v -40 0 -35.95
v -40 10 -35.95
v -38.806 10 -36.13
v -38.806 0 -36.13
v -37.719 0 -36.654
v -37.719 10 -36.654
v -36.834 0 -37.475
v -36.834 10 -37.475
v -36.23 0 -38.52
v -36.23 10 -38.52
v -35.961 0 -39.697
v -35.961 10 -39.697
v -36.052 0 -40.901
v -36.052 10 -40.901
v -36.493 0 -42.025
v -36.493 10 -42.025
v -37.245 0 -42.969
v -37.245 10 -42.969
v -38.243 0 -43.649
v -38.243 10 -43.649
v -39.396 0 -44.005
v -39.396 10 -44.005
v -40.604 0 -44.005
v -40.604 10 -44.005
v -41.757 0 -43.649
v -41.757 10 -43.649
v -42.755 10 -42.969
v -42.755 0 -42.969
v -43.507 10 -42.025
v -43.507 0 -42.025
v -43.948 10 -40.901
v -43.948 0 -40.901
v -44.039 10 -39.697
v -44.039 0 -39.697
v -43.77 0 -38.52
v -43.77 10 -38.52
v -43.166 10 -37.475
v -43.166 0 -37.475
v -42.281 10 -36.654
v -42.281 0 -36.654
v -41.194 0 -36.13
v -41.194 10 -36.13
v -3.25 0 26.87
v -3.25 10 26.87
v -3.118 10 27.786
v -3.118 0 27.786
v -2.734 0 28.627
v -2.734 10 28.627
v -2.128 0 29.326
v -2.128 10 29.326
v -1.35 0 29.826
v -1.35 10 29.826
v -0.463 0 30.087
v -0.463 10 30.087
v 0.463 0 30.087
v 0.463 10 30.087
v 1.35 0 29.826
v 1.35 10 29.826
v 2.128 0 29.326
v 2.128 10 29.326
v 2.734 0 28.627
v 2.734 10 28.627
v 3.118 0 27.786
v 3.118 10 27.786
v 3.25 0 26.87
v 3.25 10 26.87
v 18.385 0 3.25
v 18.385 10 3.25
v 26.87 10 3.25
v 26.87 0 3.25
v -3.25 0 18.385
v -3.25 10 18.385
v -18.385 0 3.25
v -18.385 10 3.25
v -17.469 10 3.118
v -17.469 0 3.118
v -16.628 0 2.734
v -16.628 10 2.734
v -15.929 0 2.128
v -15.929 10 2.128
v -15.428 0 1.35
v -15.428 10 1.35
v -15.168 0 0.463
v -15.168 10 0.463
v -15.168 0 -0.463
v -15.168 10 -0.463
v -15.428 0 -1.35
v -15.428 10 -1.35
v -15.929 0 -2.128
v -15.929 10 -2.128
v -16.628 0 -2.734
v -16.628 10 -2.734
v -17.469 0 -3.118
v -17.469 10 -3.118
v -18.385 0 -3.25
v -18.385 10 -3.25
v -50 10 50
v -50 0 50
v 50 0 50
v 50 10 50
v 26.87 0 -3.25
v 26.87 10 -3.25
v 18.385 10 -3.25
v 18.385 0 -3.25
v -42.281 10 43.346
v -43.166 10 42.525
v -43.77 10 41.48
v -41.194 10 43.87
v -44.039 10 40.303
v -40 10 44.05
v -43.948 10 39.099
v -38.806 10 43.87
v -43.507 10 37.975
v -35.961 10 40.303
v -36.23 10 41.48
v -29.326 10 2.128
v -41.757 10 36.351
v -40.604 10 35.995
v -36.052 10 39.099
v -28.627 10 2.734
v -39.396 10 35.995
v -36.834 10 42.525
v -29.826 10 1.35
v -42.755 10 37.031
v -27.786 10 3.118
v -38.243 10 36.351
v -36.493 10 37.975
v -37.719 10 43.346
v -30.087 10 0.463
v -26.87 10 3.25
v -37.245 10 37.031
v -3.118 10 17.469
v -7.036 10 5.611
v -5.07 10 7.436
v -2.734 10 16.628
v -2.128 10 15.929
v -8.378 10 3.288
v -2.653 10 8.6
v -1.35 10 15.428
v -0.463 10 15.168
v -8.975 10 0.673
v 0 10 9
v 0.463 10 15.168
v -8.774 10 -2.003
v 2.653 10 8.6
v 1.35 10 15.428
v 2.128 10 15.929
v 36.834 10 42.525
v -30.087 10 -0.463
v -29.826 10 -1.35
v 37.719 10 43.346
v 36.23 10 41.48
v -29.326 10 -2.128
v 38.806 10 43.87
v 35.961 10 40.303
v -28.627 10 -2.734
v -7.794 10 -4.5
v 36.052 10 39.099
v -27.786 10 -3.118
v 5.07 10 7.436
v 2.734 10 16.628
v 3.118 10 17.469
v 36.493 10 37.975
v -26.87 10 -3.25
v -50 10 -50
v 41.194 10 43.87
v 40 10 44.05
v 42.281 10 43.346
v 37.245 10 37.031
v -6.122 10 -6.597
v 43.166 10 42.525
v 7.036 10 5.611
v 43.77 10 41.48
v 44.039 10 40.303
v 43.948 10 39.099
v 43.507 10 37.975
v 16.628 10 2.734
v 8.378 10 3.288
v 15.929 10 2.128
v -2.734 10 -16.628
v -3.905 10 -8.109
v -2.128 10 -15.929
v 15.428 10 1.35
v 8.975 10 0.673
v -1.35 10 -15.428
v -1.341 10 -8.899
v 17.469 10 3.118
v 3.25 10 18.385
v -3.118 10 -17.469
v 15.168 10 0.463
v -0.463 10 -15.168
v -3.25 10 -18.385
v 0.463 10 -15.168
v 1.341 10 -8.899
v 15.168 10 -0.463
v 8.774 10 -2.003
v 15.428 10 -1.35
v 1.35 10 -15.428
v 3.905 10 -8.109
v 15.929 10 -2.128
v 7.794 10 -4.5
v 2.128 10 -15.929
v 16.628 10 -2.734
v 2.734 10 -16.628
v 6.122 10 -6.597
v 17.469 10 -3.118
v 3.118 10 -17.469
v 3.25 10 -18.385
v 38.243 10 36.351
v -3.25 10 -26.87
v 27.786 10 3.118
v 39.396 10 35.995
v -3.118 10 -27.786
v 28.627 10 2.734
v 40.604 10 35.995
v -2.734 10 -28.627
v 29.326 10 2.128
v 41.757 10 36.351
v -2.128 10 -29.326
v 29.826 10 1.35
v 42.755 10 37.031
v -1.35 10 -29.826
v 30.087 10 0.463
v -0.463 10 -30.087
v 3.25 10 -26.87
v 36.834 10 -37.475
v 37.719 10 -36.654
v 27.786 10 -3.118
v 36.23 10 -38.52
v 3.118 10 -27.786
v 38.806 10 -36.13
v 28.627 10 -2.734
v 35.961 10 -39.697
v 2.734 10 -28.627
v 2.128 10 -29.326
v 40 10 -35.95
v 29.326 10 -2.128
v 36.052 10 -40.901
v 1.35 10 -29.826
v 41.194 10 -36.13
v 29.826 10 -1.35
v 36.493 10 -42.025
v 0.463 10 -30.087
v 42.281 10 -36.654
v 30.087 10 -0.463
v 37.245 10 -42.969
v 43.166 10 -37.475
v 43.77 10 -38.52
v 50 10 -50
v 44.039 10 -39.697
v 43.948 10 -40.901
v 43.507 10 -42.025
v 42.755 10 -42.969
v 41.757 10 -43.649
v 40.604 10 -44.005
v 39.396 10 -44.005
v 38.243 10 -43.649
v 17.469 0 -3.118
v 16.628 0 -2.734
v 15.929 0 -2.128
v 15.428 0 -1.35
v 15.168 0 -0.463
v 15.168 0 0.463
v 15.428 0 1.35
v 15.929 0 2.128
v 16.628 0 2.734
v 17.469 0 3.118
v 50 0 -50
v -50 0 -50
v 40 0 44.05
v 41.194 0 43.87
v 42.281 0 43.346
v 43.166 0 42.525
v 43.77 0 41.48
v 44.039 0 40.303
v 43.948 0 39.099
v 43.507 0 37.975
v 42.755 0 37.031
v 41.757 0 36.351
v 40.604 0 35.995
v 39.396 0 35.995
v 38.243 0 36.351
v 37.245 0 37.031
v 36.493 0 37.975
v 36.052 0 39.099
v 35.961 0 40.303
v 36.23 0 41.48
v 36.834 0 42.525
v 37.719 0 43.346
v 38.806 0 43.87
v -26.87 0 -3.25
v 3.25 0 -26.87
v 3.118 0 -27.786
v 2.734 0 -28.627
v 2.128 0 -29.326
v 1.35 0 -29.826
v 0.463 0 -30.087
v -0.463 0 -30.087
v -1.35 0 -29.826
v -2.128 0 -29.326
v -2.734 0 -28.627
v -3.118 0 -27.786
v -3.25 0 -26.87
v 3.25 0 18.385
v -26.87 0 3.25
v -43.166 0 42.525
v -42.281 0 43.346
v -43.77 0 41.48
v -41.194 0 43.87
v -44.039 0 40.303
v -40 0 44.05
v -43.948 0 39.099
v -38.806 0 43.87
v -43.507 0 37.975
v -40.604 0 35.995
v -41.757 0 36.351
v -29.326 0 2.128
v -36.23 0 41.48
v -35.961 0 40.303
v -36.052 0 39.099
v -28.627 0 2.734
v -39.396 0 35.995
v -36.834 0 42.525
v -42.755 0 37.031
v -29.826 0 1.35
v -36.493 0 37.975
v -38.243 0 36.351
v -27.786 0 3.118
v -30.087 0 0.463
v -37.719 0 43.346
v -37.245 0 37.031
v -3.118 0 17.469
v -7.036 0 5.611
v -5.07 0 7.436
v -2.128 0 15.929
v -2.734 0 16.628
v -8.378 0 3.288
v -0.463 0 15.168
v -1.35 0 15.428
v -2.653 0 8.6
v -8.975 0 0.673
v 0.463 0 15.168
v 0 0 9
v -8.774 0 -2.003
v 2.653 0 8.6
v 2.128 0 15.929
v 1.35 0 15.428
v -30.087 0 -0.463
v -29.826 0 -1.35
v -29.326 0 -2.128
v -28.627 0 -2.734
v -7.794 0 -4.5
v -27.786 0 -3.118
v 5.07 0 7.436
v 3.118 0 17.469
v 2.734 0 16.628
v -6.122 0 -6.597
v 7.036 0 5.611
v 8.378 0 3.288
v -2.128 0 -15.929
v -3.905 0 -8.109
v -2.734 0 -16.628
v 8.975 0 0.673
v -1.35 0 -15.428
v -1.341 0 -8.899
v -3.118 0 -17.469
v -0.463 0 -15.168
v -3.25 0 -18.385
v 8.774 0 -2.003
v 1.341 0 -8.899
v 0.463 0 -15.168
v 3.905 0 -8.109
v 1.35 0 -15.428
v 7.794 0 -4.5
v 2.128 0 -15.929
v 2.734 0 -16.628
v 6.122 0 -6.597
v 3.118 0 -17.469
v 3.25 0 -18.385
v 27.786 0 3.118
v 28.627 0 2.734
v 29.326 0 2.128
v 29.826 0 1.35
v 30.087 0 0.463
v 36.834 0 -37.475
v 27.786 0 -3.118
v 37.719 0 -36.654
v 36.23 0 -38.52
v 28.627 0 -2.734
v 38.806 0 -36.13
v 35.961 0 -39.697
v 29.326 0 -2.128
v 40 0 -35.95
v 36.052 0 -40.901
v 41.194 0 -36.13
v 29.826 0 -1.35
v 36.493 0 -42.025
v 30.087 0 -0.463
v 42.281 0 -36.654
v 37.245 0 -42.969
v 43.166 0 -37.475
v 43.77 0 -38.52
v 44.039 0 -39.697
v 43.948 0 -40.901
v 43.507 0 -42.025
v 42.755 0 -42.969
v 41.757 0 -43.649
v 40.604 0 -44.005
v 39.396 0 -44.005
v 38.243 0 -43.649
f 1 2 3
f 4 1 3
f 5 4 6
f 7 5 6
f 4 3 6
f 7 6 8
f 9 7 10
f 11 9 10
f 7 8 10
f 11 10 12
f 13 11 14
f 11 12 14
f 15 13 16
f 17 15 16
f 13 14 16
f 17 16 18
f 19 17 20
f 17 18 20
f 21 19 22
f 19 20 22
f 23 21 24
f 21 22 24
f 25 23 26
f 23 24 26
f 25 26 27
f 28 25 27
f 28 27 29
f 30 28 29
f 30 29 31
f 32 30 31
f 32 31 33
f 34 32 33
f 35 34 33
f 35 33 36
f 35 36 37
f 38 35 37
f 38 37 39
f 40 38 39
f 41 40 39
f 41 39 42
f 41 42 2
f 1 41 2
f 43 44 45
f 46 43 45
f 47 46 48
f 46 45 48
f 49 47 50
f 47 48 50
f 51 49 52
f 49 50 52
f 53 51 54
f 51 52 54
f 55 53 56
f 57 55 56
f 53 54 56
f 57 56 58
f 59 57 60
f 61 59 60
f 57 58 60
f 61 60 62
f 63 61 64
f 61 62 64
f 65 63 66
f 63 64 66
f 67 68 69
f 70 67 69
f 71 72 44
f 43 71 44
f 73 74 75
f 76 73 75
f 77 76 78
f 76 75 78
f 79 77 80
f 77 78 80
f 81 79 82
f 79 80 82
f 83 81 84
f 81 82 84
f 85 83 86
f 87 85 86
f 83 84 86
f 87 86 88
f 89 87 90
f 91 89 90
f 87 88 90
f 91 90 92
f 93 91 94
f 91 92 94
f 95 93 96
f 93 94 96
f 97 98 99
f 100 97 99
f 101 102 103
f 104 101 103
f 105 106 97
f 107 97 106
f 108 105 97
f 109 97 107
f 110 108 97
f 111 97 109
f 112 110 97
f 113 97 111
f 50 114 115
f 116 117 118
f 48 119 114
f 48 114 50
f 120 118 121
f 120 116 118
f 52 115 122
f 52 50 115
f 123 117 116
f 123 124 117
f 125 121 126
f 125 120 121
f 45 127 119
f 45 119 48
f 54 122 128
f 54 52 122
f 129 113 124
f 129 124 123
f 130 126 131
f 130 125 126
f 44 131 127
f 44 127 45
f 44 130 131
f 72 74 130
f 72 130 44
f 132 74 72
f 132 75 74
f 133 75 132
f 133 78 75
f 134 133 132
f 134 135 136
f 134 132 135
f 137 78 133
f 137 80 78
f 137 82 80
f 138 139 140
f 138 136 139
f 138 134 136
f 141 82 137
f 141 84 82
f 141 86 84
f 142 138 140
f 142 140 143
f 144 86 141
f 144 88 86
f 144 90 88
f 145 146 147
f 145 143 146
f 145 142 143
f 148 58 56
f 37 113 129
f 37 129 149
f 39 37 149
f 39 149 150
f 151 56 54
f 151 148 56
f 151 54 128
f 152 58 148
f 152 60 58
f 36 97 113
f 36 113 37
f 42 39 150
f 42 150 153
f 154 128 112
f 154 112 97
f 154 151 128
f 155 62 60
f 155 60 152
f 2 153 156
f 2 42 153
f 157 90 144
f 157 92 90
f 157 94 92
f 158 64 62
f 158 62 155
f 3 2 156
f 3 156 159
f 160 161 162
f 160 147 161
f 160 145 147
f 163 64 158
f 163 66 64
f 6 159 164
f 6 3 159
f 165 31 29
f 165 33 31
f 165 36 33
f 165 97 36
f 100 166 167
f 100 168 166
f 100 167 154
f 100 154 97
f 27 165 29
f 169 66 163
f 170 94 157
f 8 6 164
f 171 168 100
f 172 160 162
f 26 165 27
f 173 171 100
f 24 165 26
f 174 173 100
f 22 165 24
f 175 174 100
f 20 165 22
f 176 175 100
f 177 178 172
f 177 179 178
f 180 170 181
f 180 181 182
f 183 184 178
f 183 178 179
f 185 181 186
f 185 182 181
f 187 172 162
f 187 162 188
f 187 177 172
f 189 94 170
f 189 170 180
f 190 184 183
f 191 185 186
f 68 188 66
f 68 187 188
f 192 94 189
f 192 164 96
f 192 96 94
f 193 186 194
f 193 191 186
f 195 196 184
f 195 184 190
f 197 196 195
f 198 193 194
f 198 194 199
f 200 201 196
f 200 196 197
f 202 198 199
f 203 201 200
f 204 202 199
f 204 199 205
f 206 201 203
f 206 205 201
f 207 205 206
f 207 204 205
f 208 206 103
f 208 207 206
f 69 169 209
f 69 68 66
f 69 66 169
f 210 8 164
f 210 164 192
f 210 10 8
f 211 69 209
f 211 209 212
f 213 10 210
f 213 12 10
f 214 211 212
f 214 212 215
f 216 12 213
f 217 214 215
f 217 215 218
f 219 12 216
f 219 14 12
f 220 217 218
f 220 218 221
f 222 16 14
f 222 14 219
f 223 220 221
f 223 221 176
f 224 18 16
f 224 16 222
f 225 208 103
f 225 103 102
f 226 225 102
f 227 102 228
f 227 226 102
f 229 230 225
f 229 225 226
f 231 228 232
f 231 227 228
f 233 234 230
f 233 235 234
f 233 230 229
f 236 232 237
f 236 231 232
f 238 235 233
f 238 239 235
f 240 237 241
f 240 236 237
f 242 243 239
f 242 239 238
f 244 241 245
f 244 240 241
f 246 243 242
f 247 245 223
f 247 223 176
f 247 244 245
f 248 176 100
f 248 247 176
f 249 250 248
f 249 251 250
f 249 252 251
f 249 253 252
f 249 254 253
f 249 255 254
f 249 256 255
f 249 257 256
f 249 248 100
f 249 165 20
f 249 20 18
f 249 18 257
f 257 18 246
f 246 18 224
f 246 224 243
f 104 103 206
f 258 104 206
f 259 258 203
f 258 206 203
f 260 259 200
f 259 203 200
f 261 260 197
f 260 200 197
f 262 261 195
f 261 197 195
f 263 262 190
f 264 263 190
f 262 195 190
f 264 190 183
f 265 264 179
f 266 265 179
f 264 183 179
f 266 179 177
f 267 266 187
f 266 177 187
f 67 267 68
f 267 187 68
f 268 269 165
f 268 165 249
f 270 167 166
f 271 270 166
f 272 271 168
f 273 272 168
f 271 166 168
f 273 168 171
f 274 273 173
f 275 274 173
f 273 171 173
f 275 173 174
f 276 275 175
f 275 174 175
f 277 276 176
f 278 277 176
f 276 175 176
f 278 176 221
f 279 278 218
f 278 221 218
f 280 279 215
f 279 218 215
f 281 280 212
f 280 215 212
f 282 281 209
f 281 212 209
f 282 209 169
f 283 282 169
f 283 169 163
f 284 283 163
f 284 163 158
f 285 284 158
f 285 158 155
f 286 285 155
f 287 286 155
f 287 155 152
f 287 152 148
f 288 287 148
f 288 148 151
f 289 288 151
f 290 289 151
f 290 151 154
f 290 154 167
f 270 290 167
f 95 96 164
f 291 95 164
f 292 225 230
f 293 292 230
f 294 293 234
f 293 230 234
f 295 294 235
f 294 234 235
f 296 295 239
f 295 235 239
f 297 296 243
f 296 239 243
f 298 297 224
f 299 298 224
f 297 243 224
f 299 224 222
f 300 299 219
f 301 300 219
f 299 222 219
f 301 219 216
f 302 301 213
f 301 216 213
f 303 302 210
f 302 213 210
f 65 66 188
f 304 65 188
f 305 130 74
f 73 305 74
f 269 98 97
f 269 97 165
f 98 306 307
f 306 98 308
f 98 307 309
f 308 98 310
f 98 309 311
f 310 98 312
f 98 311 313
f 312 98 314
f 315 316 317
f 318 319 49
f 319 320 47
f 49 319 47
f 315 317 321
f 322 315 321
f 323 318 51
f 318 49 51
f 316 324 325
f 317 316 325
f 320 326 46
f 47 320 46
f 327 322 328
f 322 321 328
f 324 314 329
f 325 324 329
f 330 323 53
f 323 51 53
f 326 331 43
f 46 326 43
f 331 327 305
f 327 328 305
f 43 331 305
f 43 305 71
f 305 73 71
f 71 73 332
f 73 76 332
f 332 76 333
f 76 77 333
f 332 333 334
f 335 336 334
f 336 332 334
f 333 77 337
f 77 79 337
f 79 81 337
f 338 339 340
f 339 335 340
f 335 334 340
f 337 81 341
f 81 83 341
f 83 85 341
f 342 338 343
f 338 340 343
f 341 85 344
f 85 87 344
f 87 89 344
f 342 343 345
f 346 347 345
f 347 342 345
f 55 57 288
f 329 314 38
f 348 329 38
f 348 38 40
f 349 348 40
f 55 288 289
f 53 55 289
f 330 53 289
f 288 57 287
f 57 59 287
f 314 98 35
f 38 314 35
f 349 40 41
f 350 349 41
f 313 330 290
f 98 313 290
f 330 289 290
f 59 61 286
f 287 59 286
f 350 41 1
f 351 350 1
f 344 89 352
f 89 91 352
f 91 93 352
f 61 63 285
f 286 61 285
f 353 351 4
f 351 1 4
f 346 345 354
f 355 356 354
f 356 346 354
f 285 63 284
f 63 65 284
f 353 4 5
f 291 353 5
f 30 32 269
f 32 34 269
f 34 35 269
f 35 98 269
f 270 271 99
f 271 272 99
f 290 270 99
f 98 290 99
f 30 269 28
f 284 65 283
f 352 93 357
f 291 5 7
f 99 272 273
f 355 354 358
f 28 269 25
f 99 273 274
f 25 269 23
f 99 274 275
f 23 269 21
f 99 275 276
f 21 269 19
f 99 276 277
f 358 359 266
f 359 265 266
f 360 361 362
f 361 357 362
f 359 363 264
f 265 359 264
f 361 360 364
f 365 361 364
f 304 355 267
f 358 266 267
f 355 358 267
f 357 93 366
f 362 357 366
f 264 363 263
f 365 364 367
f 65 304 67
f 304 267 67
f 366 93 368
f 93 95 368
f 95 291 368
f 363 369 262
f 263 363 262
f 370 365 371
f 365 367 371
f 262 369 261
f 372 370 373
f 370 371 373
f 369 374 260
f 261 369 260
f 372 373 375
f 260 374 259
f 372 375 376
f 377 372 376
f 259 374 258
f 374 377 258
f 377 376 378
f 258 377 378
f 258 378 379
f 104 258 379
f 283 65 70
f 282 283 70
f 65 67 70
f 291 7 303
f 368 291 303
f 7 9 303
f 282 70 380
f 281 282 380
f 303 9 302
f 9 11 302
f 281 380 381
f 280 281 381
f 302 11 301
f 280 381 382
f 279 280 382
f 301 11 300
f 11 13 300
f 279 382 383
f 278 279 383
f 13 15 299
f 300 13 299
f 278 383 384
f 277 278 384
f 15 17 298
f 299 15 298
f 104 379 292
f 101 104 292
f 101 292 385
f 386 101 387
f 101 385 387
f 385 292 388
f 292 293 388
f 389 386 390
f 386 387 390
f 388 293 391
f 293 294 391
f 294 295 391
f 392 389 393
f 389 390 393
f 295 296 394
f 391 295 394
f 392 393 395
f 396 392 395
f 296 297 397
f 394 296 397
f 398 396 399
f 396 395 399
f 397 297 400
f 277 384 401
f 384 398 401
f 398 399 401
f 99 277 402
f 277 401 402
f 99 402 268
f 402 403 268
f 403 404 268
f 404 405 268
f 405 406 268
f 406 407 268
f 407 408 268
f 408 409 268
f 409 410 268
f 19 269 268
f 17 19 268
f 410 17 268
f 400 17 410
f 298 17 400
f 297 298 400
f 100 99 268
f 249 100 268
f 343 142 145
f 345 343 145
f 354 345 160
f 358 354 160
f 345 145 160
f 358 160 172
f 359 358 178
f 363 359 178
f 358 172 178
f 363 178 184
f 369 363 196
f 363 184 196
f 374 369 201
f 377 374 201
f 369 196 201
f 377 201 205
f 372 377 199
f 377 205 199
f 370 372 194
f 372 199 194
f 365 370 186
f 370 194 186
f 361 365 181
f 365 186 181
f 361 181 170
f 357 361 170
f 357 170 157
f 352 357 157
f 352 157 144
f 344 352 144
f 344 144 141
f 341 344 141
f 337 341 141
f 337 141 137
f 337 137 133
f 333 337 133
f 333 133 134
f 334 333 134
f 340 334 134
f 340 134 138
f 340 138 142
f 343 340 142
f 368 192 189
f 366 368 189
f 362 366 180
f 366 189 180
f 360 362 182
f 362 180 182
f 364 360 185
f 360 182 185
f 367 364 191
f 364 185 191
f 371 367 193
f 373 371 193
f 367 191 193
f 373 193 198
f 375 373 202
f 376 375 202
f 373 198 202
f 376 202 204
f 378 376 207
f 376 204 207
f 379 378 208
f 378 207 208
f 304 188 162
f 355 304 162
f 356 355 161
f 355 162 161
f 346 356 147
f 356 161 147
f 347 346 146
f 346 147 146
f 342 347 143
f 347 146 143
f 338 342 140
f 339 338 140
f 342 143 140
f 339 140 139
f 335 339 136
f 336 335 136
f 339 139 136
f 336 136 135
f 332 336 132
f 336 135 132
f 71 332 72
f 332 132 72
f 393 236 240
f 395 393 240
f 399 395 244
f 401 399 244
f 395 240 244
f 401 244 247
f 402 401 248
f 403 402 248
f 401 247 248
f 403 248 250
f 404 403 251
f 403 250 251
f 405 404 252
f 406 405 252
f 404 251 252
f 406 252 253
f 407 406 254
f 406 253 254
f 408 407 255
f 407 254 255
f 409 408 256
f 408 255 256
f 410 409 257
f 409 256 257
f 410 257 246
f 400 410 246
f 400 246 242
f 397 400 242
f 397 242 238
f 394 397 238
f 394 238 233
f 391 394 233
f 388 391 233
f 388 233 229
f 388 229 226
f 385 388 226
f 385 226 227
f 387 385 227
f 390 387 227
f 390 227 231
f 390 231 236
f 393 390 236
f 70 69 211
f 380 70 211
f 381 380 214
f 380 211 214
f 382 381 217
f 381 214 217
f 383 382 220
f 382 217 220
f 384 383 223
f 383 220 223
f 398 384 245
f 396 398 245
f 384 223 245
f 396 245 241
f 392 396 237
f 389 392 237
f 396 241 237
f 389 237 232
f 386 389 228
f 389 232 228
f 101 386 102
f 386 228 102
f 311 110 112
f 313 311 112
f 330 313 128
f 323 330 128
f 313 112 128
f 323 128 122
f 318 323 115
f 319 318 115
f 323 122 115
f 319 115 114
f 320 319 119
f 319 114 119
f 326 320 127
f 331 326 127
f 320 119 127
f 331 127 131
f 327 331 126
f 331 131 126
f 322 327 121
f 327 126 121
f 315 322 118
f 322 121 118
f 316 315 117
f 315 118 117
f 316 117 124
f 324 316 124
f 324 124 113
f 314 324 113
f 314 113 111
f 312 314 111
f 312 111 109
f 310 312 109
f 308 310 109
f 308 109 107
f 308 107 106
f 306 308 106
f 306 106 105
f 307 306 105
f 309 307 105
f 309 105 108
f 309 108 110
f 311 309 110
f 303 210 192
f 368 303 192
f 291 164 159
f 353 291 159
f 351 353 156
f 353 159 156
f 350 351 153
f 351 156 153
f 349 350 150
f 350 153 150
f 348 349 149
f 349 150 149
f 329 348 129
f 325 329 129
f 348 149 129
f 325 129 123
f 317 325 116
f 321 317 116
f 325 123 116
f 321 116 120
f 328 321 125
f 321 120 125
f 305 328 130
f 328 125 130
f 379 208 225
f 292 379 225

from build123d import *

# Parameters (mm, degrees)
SKETCH1_W          = 100
SKETCH1_H          = 100
BASE_DEPTH         = 10
SKETCH2_R          = 9
ACTUATOR_CUT_DEPTH = 40
CUT_EXTRUDE1_REACH = 73.414
CUT_EXTRUDE2_REACH = 73.414
SKETCH5_R          = 4.05


with BuildPart() as part:
    # Sketch1 → base (new body)
    with BuildSketch(Plane(origin=(0, 0, 0), x_dir=(1, 0, 0), z_dir=(0, 1, 0))):
        Rectangle(SKETCH1_W, SKETCH1_H)
    extrude(amount=BASE_DEPTH)

    # Sketch2 → actuator cut (cut)
    with BuildSketch(Plane(origin=(0, 10, 0), x_dir=(1, 0, 0), z_dir=(0, 1, 0))):
        with Locations(Location((0, 0, 0), (0, 0, 270))):
            Circle(SKETCH2_R)
    extrude(amount=-ACTUATOR_CUT_DEPTH, mode=Mode.SUBTRACT)

    # Sketch3 → Cut-Extrude1 (cut, up to next)
    with BuildSketch(Plane(origin=(0, 10, 0), x_dir=(1, 0, 0), z_dir=(0, 1, 0)), mode=Mode.PRIVATE) as cut_extrude1_sk1:
        with BuildLine():
            Line((3.25, -26.870057685), (3.25, -18.384776311))
            ThreePointArc((3.25, -18.384776311), (0, -15.134776311), (-3.25, -18.384776311))
            Line((-3.25, -18.384776311), (-3.25, -26.870057685))
            ThreePointArc((-3.25, -26.870057685), (0, -30.120057685), (3.25, -26.870057685))
        make_face()
    cut_extrude1_tool1 = extrude(cut_extrude1_sk1.sketch, amount=-CUT_EXTRUDE1_REACH, mode=Mode.PRIVATE) & part.part
    # Sketch3 → Cut-Extrude1 (cut, up to next)
    with BuildSketch(Plane(origin=(0, 10, 0), x_dir=(1, 0, 0), z_dir=(0, 1, 0)), mode=Mode.PRIVATE) as cut_extrude1_sk2:
        with BuildLine():
            Line((26.870057685, 3.25), (18.384776311, 3.25))
            ThreePointArc((18.384776311, 3.25), (15.134776311, 0), (18.384776311, -3.25))
            Line((18.384776311, -3.25), (26.870057685, -3.25))
            ThreePointArc((26.870057685, -3.25), (30.120057685, 0), (26.870057685, 3.25))
        make_face()
    cut_extrude1_tool2 = extrude(cut_extrude1_sk2.sketch, amount=-CUT_EXTRUDE1_REACH, mode=Mode.PRIVATE) & part.part
    # Sketch3 → Cut-Extrude1 (cut, up to next)
    with BuildSketch(Plane(origin=(0, 10, 0), x_dir=(1, 0, 0), z_dir=(0, 1, 0)), mode=Mode.PRIVATE) as cut_extrude1_sk3:
        with BuildLine():
            Line((-26.870057685, -3.25), (-18.384776311, -3.25))
            ThreePointArc((-18.384776311, -3.25), (-15.134776311, 0), (-18.384776311, 3.25))
            Line((-18.384776311, 3.25), (-26.870057685, 3.25))
            ThreePointArc((-26.870057685, 3.25), (-30.120057685, 0), (-26.870057685, -3.25))
        make_face()
    cut_extrude1_tool3 = extrude(cut_extrude1_sk3.sketch, amount=-CUT_EXTRUDE1_REACH, mode=Mode.PRIVATE) & part.part
    # Sketch3 → Cut-Extrude1 (cut, up to next)
    with BuildSketch(Plane(origin=(0, 10, 0), x_dir=(1, 0, 0), z_dir=(0, 1, 0)), mode=Mode.PRIVATE) as cut_extrude1_sk4:
        with BuildLine():
            Line((-3.25, 26.870057685), (-3.25, 18.384776311))
            ThreePointArc((-3.25, 18.384776311), (0, 15.134776311), (3.25, 18.384776311))
            Line((3.25, 18.384776311), (3.25, 26.870057685))
            ThreePointArc((3.25, 26.870057685), (0, 30.120057685), (-3.25, 26.870057685))
        make_face()
    cut_extrude1_tool4 = extrude(cut_extrude1_sk4.sketch, amount=-CUT_EXTRUDE1_REACH, mode=Mode.PRIVATE) & part.part
    add(cut_extrude1_tool1.solids().sort_by_distance((0, 10, 22.627417))[0], mode=Mode.SUBTRACT)
    add(cut_extrude1_tool2.solids().sort_by_distance((22.627417, 10, 0))[0], mode=Mode.SUBTRACT)
    add(cut_extrude1_tool3.solids().sort_by_distance((-22.627417, 10, 0))[0], mode=Mode.SUBTRACT)
    add(cut_extrude1_tool4.solids().sort_by_distance((0, 10, -22.627417))[0], mode=Mode.SUBTRACT)

    # Sketch5 → Cut-Extrude2 (cut, up to next)
    with BuildSketch(Plane(origin=(0, 10, 0), x_dir=(1, 0, 0), z_dir=(0, 1, 0)), mode=Mode.PRIVATE) as cut_extrude2_sk1:
        with Locations(Location((-40, -40, 0), (0, 0, 270))):
            Circle(SKETCH5_R)
    cut_extrude2_tool1 = extrude(cut_extrude2_sk1.sketch, amount=-CUT_EXTRUDE2_REACH, mode=Mode.PRIVATE) & part.part
    # Sketch5 → Cut-Extrude2 (cut, up to next)
    with BuildSketch(Plane(origin=(0, 10, 0), x_dir=(1, 0, 0), z_dir=(0, 1, 0)), mode=Mode.PRIVATE) as cut_extrude2_sk2:
        with Locations(Location((-40, 40, 0), (0, 0, 270))):
            Circle(SKETCH5_R)
    cut_extrude2_tool2 = extrude(cut_extrude2_sk2.sketch, amount=-CUT_EXTRUDE2_REACH, mode=Mode.PRIVATE) & part.part
    # Sketch5 → Cut-Extrude2 (cut, up to next)
    with BuildSketch(Plane(origin=(0, 10, 0), x_dir=(1, 0, 0), z_dir=(0, 1, 0)), mode=Mode.PRIVATE) as cut_extrude2_sk3:
        with Locations(Location((40, -40, 0), (0, 0, 270))):
            Circle(SKETCH5_R)
    cut_extrude2_tool3 = extrude(cut_extrude2_sk3.sketch, amount=-CUT_EXTRUDE2_REACH, mode=Mode.PRIVATE) & part.part
    # Sketch5 → Cut-Extrude2 (cut, up to next)
    with BuildSketch(Plane(origin=(0, 10, 0), x_dir=(1, 0, 0), z_dir=(0, 1, 0)), mode=Mode.PRIVATE) as cut_extrude2_sk4:
        with Locations(Location((40, 40, 0), (0, 0, 270))):
            Circle(SKETCH5_R)
    cut_extrude2_tool4 = extrude(cut_extrude2_sk4.sketch, amount=-CUT_EXTRUDE2_REACH, mode=Mode.PRIVATE) & part.part
    add(cut_extrude2_tool1.solids().sort_by_distance((-40, 10, 40))[0], mode=Mode.SUBTRACT)
    add(cut_extrude2_tool2.solids().sort_by_distance((-40, 10, -40))[0], mode=Mode.SUBTRACT)
    add(cut_extrude2_tool3.solids().sort_by_distance((40, 10, 40))[0], mode=Mode.SUBTRACT)
    add(cut_extrude2_tool4.solids().sort_by_distance((40, 10, -40))[0], mode=Mode.SUBTRACT)


solid = part.part
